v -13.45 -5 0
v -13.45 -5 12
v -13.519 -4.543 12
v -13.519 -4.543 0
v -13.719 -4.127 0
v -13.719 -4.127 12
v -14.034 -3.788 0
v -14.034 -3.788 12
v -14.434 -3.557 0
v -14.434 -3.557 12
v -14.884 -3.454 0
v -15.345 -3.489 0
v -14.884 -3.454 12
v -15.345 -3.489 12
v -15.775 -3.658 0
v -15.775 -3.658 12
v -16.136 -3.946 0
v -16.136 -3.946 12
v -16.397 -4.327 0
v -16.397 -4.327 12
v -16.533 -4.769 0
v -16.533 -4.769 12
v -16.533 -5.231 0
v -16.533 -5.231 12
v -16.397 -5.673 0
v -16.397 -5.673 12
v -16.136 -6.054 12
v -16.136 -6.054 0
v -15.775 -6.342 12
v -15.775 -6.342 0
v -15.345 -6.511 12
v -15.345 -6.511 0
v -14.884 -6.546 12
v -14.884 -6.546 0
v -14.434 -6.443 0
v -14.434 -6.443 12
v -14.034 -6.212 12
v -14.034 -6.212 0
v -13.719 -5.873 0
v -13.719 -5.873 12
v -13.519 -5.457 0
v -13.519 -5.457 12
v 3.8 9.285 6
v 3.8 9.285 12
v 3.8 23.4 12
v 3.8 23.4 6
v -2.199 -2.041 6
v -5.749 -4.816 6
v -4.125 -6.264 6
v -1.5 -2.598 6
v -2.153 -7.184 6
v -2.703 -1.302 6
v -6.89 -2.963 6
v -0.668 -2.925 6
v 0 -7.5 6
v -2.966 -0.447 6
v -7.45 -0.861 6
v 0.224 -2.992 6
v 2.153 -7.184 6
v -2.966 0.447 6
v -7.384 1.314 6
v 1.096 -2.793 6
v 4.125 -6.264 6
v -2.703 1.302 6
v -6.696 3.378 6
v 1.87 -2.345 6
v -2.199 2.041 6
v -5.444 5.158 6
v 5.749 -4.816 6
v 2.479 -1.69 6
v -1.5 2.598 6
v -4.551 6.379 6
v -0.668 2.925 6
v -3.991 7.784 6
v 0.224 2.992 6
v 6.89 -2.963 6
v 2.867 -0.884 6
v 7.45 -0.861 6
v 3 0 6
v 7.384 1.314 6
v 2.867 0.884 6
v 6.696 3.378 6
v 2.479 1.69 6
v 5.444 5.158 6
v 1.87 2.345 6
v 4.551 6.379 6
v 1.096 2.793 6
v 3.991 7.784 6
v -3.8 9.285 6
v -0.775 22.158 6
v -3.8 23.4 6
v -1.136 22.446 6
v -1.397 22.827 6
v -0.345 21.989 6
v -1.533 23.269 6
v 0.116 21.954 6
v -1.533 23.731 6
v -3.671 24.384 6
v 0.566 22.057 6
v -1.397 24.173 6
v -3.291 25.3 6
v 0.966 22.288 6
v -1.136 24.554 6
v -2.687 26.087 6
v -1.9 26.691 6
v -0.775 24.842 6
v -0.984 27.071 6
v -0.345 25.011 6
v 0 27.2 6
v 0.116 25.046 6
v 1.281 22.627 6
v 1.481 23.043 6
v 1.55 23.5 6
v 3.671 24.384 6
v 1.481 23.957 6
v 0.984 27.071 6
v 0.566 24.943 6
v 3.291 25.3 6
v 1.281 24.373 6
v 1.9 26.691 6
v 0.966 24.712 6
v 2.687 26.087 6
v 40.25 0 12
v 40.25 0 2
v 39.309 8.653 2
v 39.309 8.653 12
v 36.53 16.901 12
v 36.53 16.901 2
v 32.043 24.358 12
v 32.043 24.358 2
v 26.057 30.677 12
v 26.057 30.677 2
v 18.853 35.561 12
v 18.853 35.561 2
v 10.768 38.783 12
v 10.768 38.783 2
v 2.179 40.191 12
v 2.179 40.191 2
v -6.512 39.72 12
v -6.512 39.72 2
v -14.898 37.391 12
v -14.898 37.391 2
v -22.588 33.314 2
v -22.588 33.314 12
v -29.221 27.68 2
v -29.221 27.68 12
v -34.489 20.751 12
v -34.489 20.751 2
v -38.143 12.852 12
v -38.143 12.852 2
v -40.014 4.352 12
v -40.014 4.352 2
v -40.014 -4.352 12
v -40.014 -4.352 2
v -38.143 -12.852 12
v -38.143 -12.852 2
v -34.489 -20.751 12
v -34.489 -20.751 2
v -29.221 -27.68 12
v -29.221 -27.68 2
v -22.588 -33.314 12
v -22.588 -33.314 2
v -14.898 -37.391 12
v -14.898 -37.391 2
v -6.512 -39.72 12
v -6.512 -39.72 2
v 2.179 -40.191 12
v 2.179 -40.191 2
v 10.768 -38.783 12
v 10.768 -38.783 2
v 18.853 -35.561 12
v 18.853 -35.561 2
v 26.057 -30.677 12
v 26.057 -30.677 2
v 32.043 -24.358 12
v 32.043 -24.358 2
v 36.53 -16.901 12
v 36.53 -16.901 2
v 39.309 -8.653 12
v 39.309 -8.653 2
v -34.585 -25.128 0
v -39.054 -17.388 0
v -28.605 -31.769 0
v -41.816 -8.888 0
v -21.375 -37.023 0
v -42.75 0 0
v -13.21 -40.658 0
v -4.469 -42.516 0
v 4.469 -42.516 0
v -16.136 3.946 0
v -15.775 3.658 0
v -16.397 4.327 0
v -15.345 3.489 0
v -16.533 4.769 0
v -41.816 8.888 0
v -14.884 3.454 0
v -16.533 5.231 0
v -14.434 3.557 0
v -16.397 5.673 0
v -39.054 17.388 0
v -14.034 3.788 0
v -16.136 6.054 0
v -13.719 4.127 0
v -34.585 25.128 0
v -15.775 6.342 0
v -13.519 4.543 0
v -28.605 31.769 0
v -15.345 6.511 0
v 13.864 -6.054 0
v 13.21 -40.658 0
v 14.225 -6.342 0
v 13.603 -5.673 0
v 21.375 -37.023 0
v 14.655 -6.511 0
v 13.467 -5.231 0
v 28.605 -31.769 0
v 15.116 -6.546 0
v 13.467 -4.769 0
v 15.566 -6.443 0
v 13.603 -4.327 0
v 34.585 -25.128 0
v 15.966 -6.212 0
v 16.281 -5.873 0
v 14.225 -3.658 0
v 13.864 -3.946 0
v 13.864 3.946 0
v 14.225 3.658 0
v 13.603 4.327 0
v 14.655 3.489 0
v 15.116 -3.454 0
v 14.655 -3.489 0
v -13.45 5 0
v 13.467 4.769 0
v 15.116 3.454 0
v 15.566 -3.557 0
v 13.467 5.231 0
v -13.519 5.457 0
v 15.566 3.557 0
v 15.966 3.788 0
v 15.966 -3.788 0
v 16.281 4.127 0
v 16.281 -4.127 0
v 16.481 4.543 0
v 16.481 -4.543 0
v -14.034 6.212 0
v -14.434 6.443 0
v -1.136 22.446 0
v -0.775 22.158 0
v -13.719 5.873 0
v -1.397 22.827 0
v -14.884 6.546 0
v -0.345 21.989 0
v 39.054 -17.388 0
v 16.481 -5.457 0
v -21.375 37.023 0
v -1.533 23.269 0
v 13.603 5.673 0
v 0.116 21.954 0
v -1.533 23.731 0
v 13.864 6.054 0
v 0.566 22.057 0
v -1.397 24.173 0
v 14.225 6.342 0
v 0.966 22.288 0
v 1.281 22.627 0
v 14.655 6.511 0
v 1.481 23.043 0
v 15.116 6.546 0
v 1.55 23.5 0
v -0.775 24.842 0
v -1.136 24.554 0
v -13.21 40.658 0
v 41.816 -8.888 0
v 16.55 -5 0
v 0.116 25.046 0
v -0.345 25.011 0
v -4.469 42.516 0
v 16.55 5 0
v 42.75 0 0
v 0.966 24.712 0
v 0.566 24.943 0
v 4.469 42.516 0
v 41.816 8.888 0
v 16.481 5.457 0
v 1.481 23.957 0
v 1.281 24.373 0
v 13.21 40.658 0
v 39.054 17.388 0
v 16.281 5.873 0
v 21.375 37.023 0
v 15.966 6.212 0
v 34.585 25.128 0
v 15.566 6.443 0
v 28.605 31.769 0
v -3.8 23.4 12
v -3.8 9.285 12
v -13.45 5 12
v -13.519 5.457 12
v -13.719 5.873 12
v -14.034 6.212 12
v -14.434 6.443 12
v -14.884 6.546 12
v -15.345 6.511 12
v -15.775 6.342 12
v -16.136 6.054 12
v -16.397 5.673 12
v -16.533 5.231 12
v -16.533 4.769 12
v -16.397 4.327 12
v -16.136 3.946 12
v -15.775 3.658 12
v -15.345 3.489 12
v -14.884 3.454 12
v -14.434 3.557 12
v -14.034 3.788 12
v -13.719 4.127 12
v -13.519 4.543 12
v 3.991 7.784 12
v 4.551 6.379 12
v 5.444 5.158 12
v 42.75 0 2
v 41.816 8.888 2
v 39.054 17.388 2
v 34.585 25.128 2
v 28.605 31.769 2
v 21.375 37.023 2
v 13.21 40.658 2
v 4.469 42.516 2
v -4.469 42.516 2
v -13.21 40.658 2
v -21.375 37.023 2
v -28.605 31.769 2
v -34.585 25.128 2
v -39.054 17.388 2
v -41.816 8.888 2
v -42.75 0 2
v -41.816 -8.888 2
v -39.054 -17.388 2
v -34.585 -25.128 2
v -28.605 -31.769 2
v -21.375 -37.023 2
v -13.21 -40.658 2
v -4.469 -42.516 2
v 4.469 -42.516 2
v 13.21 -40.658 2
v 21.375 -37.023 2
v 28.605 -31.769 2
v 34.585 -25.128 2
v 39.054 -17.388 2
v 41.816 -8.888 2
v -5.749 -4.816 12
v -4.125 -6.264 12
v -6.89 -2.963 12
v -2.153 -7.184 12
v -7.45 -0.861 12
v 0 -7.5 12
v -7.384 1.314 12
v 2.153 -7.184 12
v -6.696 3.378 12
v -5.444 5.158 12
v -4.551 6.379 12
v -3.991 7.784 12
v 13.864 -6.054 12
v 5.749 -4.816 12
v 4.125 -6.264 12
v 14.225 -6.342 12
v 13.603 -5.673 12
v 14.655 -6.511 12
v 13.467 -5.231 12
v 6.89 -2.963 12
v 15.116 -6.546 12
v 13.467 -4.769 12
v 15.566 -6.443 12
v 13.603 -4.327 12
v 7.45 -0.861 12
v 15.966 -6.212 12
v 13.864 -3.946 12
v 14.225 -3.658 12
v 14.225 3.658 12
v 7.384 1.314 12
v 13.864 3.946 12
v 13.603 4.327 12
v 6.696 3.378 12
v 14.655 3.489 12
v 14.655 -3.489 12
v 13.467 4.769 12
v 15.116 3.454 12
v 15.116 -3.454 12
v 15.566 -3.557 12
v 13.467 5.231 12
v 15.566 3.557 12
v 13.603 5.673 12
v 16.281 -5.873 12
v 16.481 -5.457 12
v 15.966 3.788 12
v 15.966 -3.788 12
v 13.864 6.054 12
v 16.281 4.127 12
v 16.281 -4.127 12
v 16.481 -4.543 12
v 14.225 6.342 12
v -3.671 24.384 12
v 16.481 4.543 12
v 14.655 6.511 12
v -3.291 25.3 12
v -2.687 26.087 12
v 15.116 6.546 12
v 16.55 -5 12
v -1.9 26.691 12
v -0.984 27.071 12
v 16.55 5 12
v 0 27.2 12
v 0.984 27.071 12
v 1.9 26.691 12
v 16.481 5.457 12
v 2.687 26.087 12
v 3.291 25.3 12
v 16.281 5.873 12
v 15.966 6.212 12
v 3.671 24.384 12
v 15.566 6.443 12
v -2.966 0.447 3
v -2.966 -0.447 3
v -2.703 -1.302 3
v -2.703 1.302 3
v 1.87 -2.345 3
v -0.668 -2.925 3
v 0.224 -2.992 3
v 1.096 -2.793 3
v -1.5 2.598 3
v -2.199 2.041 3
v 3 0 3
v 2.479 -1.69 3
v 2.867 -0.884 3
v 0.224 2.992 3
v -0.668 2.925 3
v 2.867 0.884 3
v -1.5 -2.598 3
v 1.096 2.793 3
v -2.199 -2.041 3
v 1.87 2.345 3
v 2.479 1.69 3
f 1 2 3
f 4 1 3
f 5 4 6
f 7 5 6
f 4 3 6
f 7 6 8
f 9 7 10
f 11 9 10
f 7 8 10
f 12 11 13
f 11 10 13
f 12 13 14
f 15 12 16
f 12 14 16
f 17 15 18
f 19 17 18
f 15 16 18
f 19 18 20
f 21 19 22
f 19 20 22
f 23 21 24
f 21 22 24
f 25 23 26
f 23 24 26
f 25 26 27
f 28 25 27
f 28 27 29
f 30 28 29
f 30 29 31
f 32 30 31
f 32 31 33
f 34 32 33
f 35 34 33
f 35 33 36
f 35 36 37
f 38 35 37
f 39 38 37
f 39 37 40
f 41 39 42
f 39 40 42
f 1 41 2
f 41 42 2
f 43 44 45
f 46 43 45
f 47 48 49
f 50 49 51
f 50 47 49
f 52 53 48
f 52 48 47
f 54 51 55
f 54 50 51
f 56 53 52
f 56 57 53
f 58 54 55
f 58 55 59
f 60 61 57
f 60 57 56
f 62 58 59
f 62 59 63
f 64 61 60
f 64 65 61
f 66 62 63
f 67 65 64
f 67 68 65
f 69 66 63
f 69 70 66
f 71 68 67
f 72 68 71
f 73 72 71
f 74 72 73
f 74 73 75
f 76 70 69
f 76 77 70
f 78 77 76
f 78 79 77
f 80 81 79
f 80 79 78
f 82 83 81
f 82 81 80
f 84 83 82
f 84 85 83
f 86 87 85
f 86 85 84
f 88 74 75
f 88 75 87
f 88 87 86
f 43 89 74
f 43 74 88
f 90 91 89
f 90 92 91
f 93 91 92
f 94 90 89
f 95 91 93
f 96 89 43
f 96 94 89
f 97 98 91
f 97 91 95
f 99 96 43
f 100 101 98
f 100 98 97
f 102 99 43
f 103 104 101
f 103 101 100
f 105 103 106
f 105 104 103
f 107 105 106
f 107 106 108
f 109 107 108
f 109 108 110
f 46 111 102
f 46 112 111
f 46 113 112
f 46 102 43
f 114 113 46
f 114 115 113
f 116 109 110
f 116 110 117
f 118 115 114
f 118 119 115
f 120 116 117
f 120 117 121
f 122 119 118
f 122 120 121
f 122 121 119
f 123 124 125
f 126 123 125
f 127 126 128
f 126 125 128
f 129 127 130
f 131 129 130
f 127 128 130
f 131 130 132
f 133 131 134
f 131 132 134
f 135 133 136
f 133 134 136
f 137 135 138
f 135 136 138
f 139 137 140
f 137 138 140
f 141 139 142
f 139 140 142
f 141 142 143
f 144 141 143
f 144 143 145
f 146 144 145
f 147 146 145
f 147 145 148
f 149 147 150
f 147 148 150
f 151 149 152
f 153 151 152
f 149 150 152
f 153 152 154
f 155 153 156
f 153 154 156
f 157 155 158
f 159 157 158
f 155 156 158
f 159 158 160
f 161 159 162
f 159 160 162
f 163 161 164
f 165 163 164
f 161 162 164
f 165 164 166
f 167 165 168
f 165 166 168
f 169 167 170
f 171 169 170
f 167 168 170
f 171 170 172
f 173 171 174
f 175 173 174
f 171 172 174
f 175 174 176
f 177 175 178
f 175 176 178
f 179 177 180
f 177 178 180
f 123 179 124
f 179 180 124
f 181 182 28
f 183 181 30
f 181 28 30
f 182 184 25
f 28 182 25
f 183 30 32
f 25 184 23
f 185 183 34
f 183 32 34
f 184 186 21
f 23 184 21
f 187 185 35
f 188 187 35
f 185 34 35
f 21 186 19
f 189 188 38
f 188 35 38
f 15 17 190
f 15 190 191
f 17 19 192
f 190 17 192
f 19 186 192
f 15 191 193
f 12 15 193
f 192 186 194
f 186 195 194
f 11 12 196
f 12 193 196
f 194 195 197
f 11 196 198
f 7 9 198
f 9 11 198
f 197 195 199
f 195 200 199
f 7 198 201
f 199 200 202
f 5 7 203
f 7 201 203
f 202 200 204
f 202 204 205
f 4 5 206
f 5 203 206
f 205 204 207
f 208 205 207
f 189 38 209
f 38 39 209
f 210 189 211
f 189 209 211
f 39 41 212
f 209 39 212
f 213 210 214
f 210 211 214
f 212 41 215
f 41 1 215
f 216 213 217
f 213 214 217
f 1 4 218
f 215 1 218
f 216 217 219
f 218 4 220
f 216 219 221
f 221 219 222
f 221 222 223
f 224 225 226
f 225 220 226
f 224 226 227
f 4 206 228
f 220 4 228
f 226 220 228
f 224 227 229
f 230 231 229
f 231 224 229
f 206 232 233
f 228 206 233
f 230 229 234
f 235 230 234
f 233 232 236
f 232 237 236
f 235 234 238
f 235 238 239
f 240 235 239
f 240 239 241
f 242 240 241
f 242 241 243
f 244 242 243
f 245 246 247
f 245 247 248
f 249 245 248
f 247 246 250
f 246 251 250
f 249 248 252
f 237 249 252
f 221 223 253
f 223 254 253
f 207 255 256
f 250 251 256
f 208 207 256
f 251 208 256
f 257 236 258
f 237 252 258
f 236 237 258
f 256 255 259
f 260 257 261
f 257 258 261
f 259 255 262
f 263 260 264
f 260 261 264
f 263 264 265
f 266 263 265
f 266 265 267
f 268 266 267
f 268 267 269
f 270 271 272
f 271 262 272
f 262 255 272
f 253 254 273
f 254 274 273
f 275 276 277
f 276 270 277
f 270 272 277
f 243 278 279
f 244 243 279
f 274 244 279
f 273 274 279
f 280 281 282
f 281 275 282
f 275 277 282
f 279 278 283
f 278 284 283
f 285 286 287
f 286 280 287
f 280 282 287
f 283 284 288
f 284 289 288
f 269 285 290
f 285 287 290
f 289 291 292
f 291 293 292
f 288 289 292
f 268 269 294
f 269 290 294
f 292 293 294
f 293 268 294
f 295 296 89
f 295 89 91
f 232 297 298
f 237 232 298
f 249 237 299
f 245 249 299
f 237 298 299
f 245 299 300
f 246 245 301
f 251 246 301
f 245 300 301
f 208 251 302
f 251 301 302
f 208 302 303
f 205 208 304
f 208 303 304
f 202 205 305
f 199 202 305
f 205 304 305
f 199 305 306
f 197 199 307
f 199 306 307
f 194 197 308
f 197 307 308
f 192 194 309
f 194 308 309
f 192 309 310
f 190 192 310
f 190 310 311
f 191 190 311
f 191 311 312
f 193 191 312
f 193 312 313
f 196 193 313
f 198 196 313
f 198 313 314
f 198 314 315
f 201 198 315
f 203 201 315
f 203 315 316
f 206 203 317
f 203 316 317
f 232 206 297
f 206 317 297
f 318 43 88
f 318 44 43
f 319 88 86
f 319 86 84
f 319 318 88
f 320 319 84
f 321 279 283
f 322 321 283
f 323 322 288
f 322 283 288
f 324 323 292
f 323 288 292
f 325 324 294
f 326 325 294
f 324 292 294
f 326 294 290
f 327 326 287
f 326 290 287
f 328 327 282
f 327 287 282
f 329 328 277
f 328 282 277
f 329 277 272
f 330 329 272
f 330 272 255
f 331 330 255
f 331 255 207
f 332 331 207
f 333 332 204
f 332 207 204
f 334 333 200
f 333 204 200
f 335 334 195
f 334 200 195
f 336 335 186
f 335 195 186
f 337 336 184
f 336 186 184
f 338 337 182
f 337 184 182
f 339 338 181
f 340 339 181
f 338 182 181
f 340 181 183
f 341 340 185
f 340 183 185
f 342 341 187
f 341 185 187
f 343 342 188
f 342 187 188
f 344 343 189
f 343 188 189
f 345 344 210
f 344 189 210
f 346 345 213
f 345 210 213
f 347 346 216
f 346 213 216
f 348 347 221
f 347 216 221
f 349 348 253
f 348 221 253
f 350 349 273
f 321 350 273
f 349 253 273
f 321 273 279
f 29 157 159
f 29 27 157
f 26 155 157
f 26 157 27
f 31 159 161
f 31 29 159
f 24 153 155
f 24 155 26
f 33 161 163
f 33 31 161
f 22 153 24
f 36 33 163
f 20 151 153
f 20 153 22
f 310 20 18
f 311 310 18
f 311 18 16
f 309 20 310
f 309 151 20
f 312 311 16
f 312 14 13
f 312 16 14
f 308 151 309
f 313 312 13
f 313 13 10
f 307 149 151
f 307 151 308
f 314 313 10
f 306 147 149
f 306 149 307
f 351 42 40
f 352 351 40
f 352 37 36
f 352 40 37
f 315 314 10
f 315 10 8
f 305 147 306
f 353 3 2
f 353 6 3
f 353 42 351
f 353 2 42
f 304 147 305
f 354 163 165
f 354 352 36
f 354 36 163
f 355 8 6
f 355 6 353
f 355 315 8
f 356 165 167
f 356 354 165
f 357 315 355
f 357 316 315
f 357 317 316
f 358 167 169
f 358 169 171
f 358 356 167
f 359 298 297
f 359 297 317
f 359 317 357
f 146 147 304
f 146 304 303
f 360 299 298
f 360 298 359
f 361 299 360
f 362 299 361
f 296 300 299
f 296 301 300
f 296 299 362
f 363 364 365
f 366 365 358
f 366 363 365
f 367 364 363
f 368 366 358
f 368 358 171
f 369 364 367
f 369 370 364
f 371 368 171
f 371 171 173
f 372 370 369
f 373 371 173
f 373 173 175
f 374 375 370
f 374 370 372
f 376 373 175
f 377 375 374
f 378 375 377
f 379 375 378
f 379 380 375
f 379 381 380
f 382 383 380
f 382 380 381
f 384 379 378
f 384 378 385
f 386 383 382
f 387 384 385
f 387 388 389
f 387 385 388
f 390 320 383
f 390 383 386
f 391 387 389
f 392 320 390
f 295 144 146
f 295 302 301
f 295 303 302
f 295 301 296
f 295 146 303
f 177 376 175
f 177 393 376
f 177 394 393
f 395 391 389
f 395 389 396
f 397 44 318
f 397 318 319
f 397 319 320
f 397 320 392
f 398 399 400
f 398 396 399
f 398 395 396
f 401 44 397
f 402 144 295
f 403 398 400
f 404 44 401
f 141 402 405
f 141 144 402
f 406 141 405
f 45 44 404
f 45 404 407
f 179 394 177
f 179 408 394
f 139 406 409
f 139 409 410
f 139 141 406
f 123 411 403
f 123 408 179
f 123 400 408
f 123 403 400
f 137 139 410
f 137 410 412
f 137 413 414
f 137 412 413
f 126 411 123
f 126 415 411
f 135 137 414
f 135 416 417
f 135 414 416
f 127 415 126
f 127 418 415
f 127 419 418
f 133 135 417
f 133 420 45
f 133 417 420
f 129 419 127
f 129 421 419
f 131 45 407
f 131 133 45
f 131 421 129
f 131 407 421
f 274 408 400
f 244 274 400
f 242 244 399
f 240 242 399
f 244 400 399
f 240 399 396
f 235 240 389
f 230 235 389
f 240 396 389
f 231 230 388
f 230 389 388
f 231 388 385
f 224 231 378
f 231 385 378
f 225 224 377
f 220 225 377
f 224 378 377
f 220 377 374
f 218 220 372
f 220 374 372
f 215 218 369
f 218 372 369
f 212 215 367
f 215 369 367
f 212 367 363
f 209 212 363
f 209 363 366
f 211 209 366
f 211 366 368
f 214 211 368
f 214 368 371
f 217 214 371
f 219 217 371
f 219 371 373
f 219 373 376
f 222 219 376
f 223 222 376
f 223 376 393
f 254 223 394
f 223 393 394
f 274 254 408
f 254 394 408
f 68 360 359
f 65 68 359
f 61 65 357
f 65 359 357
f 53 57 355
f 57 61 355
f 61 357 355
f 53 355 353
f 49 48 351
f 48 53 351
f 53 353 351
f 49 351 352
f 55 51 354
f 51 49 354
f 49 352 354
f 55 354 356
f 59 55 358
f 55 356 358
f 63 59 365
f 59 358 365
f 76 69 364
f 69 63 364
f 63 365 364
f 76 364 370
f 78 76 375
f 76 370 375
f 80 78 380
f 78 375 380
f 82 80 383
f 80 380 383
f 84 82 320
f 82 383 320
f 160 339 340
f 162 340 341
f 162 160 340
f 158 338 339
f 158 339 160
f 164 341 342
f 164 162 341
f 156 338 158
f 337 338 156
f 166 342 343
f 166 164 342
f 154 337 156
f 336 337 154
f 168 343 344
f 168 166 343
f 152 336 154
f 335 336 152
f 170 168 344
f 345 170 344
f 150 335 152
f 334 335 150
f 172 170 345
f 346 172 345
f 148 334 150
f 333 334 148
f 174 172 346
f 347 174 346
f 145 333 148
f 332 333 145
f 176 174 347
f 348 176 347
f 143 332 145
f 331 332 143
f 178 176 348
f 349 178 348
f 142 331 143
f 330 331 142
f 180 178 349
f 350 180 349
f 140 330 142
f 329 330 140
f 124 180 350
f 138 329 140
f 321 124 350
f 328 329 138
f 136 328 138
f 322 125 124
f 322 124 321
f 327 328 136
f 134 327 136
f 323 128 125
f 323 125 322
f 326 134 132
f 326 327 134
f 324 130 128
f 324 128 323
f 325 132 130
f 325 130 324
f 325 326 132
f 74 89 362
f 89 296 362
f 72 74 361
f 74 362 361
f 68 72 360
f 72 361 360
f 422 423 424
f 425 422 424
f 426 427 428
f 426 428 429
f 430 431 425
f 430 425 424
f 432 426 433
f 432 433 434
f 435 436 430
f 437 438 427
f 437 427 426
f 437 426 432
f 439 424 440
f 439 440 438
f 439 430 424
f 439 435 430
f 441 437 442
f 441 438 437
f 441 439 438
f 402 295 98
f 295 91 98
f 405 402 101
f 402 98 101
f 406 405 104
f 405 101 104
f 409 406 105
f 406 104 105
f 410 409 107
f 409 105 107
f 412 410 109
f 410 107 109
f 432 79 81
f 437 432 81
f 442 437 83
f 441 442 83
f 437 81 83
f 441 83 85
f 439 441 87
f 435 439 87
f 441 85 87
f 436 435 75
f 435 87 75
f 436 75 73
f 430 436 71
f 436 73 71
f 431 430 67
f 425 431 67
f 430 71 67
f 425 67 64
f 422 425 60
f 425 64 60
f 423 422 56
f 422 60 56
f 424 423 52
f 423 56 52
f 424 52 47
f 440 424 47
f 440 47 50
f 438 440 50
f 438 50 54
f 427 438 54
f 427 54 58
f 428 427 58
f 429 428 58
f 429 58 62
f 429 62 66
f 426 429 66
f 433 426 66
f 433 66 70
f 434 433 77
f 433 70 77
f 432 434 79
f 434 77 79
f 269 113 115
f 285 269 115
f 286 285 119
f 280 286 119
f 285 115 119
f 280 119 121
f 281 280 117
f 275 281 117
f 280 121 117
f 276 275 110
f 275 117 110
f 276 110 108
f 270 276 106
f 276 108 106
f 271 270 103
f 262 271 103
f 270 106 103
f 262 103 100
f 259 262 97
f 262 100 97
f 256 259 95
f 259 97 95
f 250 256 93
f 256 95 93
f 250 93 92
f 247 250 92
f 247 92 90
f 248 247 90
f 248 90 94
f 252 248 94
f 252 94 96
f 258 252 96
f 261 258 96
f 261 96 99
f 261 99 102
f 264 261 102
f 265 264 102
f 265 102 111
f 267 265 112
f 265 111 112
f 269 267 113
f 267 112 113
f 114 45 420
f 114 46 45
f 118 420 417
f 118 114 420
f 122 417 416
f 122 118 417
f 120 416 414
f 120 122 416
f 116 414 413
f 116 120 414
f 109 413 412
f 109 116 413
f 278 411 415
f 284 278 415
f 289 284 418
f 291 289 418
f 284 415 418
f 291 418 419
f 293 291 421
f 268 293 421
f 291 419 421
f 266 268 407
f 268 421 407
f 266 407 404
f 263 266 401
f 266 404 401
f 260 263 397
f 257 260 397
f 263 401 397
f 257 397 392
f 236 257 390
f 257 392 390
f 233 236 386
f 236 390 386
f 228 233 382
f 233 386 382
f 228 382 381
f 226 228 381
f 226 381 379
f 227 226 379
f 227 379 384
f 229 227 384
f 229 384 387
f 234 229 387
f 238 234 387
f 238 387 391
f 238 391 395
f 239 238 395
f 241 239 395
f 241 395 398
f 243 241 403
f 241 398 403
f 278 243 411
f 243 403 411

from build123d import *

# Parameters (mm, degrees)
SKETCH_R        = 42.75
PAD_DEPTH       = 2
SKETCH001_R     = 40.25
PAD001_DEPTH    = 10
SKETCH002_R     = 7.5
POCKET_DEPTH    = 6
SKETCH003_W     = 7.6
SKETCH003_H     = 27.2
POCKET001_DEPTH = 6
FILLET_R        = 6
FILLET001_R     = 3.7999
SKETCH004_R     = 1.55
POCKET002_DEPTH = 6
SKETCH005_R     = 3
POCKET003_DEPTH = 3
SKETCH006_R     = 1.55
POCKET004_DEPTH = 12


with BuildPart() as part:
    # Sketch → Pad (new body)
    with BuildSketch(Plane.XY):
        Circle(SKETCH_R)
    extrude(amount=PAD_DEPTH)

    # Sketch001 (on Face3 of Pad) → Pad001 (join)
    with BuildSketch(Plane.XY.offset(2)):
        Circle(SKETCH001_R)
    extrude(amount=PAD001_DEPTH)

    # Sketch002 (on Face5 of Pad001) → Pocket (cut)
    with BuildSketch(Plane.XY.offset(12)):
        Circle(SKETCH002_R)
    extrude(amount=-POCKET_DEPTH, mode=Mode.SUBTRACT)

    # Sketch003 (on Face5 of Pocket) → Pocket001 (cut)
    with BuildSketch(Plane.XY.offset(12)):
        with Locations((0, 13.6)):
            Rectangle(SKETCH003_W, SKETCH003_H)
    extrude(amount=-POCKET001_DEPTH, mode=Mode.SUBTRACT)

    # Fillet
    fillet_edges = [part.edges().sort_by_distance(p)[0] for p in [
        (-3.8, 6.466065, 9),
        (3.8, 6.466065, 9),
    ]]
    fillet(fillet_edges, radius=FILLET_R)

    # Fillet001
    fillet001_edges = [part.edges().sort_by_distance(p)[0] for p in [
        (3.8, 27.2, 9),
        (-3.8, 27.2, 9),
    ]]
    fillet(fillet001_edges, radius=FILLET001_R)

    # Sketch004 (on Face12 of Fillet001) → Pocket002 (cut)
    with BuildSketch(Plane.XY.offset(6)):
        with Locations((0, 23.5)):
            Circle(SKETCH004_R)
    extrude(amount=-POCKET002_DEPTH, mode=Mode.SUBTRACT)

    # Sketch005 (on Face13 of Pocket002) → Pocket003 (cut)
    with BuildSketch(Plane.XY.offset(6)):
        Circle(SKETCH005_R)
    extrude(amount=-POCKET003_DEPTH, mode=Mode.SUBTRACT)

    # Sketch006 (on Face1 of Pocket003) → Pocket004 (cut)
    with BuildSketch(Plane.XY.offset(12)):
        with Locations((-15, 5)):
            Circle(SKETCH006_R)
        with Locations((15, 5)):
            Circle(SKETCH006_R)
        with Locations((15, -5)):
            Circle(SKETCH006_R)
        with Locations((-15, -5)):
            Circle(SKETCH006_R)
    extrude(amount=-POCKET004_DEPTH, mode=Mode.SUBTRACT)


solid = part.part
